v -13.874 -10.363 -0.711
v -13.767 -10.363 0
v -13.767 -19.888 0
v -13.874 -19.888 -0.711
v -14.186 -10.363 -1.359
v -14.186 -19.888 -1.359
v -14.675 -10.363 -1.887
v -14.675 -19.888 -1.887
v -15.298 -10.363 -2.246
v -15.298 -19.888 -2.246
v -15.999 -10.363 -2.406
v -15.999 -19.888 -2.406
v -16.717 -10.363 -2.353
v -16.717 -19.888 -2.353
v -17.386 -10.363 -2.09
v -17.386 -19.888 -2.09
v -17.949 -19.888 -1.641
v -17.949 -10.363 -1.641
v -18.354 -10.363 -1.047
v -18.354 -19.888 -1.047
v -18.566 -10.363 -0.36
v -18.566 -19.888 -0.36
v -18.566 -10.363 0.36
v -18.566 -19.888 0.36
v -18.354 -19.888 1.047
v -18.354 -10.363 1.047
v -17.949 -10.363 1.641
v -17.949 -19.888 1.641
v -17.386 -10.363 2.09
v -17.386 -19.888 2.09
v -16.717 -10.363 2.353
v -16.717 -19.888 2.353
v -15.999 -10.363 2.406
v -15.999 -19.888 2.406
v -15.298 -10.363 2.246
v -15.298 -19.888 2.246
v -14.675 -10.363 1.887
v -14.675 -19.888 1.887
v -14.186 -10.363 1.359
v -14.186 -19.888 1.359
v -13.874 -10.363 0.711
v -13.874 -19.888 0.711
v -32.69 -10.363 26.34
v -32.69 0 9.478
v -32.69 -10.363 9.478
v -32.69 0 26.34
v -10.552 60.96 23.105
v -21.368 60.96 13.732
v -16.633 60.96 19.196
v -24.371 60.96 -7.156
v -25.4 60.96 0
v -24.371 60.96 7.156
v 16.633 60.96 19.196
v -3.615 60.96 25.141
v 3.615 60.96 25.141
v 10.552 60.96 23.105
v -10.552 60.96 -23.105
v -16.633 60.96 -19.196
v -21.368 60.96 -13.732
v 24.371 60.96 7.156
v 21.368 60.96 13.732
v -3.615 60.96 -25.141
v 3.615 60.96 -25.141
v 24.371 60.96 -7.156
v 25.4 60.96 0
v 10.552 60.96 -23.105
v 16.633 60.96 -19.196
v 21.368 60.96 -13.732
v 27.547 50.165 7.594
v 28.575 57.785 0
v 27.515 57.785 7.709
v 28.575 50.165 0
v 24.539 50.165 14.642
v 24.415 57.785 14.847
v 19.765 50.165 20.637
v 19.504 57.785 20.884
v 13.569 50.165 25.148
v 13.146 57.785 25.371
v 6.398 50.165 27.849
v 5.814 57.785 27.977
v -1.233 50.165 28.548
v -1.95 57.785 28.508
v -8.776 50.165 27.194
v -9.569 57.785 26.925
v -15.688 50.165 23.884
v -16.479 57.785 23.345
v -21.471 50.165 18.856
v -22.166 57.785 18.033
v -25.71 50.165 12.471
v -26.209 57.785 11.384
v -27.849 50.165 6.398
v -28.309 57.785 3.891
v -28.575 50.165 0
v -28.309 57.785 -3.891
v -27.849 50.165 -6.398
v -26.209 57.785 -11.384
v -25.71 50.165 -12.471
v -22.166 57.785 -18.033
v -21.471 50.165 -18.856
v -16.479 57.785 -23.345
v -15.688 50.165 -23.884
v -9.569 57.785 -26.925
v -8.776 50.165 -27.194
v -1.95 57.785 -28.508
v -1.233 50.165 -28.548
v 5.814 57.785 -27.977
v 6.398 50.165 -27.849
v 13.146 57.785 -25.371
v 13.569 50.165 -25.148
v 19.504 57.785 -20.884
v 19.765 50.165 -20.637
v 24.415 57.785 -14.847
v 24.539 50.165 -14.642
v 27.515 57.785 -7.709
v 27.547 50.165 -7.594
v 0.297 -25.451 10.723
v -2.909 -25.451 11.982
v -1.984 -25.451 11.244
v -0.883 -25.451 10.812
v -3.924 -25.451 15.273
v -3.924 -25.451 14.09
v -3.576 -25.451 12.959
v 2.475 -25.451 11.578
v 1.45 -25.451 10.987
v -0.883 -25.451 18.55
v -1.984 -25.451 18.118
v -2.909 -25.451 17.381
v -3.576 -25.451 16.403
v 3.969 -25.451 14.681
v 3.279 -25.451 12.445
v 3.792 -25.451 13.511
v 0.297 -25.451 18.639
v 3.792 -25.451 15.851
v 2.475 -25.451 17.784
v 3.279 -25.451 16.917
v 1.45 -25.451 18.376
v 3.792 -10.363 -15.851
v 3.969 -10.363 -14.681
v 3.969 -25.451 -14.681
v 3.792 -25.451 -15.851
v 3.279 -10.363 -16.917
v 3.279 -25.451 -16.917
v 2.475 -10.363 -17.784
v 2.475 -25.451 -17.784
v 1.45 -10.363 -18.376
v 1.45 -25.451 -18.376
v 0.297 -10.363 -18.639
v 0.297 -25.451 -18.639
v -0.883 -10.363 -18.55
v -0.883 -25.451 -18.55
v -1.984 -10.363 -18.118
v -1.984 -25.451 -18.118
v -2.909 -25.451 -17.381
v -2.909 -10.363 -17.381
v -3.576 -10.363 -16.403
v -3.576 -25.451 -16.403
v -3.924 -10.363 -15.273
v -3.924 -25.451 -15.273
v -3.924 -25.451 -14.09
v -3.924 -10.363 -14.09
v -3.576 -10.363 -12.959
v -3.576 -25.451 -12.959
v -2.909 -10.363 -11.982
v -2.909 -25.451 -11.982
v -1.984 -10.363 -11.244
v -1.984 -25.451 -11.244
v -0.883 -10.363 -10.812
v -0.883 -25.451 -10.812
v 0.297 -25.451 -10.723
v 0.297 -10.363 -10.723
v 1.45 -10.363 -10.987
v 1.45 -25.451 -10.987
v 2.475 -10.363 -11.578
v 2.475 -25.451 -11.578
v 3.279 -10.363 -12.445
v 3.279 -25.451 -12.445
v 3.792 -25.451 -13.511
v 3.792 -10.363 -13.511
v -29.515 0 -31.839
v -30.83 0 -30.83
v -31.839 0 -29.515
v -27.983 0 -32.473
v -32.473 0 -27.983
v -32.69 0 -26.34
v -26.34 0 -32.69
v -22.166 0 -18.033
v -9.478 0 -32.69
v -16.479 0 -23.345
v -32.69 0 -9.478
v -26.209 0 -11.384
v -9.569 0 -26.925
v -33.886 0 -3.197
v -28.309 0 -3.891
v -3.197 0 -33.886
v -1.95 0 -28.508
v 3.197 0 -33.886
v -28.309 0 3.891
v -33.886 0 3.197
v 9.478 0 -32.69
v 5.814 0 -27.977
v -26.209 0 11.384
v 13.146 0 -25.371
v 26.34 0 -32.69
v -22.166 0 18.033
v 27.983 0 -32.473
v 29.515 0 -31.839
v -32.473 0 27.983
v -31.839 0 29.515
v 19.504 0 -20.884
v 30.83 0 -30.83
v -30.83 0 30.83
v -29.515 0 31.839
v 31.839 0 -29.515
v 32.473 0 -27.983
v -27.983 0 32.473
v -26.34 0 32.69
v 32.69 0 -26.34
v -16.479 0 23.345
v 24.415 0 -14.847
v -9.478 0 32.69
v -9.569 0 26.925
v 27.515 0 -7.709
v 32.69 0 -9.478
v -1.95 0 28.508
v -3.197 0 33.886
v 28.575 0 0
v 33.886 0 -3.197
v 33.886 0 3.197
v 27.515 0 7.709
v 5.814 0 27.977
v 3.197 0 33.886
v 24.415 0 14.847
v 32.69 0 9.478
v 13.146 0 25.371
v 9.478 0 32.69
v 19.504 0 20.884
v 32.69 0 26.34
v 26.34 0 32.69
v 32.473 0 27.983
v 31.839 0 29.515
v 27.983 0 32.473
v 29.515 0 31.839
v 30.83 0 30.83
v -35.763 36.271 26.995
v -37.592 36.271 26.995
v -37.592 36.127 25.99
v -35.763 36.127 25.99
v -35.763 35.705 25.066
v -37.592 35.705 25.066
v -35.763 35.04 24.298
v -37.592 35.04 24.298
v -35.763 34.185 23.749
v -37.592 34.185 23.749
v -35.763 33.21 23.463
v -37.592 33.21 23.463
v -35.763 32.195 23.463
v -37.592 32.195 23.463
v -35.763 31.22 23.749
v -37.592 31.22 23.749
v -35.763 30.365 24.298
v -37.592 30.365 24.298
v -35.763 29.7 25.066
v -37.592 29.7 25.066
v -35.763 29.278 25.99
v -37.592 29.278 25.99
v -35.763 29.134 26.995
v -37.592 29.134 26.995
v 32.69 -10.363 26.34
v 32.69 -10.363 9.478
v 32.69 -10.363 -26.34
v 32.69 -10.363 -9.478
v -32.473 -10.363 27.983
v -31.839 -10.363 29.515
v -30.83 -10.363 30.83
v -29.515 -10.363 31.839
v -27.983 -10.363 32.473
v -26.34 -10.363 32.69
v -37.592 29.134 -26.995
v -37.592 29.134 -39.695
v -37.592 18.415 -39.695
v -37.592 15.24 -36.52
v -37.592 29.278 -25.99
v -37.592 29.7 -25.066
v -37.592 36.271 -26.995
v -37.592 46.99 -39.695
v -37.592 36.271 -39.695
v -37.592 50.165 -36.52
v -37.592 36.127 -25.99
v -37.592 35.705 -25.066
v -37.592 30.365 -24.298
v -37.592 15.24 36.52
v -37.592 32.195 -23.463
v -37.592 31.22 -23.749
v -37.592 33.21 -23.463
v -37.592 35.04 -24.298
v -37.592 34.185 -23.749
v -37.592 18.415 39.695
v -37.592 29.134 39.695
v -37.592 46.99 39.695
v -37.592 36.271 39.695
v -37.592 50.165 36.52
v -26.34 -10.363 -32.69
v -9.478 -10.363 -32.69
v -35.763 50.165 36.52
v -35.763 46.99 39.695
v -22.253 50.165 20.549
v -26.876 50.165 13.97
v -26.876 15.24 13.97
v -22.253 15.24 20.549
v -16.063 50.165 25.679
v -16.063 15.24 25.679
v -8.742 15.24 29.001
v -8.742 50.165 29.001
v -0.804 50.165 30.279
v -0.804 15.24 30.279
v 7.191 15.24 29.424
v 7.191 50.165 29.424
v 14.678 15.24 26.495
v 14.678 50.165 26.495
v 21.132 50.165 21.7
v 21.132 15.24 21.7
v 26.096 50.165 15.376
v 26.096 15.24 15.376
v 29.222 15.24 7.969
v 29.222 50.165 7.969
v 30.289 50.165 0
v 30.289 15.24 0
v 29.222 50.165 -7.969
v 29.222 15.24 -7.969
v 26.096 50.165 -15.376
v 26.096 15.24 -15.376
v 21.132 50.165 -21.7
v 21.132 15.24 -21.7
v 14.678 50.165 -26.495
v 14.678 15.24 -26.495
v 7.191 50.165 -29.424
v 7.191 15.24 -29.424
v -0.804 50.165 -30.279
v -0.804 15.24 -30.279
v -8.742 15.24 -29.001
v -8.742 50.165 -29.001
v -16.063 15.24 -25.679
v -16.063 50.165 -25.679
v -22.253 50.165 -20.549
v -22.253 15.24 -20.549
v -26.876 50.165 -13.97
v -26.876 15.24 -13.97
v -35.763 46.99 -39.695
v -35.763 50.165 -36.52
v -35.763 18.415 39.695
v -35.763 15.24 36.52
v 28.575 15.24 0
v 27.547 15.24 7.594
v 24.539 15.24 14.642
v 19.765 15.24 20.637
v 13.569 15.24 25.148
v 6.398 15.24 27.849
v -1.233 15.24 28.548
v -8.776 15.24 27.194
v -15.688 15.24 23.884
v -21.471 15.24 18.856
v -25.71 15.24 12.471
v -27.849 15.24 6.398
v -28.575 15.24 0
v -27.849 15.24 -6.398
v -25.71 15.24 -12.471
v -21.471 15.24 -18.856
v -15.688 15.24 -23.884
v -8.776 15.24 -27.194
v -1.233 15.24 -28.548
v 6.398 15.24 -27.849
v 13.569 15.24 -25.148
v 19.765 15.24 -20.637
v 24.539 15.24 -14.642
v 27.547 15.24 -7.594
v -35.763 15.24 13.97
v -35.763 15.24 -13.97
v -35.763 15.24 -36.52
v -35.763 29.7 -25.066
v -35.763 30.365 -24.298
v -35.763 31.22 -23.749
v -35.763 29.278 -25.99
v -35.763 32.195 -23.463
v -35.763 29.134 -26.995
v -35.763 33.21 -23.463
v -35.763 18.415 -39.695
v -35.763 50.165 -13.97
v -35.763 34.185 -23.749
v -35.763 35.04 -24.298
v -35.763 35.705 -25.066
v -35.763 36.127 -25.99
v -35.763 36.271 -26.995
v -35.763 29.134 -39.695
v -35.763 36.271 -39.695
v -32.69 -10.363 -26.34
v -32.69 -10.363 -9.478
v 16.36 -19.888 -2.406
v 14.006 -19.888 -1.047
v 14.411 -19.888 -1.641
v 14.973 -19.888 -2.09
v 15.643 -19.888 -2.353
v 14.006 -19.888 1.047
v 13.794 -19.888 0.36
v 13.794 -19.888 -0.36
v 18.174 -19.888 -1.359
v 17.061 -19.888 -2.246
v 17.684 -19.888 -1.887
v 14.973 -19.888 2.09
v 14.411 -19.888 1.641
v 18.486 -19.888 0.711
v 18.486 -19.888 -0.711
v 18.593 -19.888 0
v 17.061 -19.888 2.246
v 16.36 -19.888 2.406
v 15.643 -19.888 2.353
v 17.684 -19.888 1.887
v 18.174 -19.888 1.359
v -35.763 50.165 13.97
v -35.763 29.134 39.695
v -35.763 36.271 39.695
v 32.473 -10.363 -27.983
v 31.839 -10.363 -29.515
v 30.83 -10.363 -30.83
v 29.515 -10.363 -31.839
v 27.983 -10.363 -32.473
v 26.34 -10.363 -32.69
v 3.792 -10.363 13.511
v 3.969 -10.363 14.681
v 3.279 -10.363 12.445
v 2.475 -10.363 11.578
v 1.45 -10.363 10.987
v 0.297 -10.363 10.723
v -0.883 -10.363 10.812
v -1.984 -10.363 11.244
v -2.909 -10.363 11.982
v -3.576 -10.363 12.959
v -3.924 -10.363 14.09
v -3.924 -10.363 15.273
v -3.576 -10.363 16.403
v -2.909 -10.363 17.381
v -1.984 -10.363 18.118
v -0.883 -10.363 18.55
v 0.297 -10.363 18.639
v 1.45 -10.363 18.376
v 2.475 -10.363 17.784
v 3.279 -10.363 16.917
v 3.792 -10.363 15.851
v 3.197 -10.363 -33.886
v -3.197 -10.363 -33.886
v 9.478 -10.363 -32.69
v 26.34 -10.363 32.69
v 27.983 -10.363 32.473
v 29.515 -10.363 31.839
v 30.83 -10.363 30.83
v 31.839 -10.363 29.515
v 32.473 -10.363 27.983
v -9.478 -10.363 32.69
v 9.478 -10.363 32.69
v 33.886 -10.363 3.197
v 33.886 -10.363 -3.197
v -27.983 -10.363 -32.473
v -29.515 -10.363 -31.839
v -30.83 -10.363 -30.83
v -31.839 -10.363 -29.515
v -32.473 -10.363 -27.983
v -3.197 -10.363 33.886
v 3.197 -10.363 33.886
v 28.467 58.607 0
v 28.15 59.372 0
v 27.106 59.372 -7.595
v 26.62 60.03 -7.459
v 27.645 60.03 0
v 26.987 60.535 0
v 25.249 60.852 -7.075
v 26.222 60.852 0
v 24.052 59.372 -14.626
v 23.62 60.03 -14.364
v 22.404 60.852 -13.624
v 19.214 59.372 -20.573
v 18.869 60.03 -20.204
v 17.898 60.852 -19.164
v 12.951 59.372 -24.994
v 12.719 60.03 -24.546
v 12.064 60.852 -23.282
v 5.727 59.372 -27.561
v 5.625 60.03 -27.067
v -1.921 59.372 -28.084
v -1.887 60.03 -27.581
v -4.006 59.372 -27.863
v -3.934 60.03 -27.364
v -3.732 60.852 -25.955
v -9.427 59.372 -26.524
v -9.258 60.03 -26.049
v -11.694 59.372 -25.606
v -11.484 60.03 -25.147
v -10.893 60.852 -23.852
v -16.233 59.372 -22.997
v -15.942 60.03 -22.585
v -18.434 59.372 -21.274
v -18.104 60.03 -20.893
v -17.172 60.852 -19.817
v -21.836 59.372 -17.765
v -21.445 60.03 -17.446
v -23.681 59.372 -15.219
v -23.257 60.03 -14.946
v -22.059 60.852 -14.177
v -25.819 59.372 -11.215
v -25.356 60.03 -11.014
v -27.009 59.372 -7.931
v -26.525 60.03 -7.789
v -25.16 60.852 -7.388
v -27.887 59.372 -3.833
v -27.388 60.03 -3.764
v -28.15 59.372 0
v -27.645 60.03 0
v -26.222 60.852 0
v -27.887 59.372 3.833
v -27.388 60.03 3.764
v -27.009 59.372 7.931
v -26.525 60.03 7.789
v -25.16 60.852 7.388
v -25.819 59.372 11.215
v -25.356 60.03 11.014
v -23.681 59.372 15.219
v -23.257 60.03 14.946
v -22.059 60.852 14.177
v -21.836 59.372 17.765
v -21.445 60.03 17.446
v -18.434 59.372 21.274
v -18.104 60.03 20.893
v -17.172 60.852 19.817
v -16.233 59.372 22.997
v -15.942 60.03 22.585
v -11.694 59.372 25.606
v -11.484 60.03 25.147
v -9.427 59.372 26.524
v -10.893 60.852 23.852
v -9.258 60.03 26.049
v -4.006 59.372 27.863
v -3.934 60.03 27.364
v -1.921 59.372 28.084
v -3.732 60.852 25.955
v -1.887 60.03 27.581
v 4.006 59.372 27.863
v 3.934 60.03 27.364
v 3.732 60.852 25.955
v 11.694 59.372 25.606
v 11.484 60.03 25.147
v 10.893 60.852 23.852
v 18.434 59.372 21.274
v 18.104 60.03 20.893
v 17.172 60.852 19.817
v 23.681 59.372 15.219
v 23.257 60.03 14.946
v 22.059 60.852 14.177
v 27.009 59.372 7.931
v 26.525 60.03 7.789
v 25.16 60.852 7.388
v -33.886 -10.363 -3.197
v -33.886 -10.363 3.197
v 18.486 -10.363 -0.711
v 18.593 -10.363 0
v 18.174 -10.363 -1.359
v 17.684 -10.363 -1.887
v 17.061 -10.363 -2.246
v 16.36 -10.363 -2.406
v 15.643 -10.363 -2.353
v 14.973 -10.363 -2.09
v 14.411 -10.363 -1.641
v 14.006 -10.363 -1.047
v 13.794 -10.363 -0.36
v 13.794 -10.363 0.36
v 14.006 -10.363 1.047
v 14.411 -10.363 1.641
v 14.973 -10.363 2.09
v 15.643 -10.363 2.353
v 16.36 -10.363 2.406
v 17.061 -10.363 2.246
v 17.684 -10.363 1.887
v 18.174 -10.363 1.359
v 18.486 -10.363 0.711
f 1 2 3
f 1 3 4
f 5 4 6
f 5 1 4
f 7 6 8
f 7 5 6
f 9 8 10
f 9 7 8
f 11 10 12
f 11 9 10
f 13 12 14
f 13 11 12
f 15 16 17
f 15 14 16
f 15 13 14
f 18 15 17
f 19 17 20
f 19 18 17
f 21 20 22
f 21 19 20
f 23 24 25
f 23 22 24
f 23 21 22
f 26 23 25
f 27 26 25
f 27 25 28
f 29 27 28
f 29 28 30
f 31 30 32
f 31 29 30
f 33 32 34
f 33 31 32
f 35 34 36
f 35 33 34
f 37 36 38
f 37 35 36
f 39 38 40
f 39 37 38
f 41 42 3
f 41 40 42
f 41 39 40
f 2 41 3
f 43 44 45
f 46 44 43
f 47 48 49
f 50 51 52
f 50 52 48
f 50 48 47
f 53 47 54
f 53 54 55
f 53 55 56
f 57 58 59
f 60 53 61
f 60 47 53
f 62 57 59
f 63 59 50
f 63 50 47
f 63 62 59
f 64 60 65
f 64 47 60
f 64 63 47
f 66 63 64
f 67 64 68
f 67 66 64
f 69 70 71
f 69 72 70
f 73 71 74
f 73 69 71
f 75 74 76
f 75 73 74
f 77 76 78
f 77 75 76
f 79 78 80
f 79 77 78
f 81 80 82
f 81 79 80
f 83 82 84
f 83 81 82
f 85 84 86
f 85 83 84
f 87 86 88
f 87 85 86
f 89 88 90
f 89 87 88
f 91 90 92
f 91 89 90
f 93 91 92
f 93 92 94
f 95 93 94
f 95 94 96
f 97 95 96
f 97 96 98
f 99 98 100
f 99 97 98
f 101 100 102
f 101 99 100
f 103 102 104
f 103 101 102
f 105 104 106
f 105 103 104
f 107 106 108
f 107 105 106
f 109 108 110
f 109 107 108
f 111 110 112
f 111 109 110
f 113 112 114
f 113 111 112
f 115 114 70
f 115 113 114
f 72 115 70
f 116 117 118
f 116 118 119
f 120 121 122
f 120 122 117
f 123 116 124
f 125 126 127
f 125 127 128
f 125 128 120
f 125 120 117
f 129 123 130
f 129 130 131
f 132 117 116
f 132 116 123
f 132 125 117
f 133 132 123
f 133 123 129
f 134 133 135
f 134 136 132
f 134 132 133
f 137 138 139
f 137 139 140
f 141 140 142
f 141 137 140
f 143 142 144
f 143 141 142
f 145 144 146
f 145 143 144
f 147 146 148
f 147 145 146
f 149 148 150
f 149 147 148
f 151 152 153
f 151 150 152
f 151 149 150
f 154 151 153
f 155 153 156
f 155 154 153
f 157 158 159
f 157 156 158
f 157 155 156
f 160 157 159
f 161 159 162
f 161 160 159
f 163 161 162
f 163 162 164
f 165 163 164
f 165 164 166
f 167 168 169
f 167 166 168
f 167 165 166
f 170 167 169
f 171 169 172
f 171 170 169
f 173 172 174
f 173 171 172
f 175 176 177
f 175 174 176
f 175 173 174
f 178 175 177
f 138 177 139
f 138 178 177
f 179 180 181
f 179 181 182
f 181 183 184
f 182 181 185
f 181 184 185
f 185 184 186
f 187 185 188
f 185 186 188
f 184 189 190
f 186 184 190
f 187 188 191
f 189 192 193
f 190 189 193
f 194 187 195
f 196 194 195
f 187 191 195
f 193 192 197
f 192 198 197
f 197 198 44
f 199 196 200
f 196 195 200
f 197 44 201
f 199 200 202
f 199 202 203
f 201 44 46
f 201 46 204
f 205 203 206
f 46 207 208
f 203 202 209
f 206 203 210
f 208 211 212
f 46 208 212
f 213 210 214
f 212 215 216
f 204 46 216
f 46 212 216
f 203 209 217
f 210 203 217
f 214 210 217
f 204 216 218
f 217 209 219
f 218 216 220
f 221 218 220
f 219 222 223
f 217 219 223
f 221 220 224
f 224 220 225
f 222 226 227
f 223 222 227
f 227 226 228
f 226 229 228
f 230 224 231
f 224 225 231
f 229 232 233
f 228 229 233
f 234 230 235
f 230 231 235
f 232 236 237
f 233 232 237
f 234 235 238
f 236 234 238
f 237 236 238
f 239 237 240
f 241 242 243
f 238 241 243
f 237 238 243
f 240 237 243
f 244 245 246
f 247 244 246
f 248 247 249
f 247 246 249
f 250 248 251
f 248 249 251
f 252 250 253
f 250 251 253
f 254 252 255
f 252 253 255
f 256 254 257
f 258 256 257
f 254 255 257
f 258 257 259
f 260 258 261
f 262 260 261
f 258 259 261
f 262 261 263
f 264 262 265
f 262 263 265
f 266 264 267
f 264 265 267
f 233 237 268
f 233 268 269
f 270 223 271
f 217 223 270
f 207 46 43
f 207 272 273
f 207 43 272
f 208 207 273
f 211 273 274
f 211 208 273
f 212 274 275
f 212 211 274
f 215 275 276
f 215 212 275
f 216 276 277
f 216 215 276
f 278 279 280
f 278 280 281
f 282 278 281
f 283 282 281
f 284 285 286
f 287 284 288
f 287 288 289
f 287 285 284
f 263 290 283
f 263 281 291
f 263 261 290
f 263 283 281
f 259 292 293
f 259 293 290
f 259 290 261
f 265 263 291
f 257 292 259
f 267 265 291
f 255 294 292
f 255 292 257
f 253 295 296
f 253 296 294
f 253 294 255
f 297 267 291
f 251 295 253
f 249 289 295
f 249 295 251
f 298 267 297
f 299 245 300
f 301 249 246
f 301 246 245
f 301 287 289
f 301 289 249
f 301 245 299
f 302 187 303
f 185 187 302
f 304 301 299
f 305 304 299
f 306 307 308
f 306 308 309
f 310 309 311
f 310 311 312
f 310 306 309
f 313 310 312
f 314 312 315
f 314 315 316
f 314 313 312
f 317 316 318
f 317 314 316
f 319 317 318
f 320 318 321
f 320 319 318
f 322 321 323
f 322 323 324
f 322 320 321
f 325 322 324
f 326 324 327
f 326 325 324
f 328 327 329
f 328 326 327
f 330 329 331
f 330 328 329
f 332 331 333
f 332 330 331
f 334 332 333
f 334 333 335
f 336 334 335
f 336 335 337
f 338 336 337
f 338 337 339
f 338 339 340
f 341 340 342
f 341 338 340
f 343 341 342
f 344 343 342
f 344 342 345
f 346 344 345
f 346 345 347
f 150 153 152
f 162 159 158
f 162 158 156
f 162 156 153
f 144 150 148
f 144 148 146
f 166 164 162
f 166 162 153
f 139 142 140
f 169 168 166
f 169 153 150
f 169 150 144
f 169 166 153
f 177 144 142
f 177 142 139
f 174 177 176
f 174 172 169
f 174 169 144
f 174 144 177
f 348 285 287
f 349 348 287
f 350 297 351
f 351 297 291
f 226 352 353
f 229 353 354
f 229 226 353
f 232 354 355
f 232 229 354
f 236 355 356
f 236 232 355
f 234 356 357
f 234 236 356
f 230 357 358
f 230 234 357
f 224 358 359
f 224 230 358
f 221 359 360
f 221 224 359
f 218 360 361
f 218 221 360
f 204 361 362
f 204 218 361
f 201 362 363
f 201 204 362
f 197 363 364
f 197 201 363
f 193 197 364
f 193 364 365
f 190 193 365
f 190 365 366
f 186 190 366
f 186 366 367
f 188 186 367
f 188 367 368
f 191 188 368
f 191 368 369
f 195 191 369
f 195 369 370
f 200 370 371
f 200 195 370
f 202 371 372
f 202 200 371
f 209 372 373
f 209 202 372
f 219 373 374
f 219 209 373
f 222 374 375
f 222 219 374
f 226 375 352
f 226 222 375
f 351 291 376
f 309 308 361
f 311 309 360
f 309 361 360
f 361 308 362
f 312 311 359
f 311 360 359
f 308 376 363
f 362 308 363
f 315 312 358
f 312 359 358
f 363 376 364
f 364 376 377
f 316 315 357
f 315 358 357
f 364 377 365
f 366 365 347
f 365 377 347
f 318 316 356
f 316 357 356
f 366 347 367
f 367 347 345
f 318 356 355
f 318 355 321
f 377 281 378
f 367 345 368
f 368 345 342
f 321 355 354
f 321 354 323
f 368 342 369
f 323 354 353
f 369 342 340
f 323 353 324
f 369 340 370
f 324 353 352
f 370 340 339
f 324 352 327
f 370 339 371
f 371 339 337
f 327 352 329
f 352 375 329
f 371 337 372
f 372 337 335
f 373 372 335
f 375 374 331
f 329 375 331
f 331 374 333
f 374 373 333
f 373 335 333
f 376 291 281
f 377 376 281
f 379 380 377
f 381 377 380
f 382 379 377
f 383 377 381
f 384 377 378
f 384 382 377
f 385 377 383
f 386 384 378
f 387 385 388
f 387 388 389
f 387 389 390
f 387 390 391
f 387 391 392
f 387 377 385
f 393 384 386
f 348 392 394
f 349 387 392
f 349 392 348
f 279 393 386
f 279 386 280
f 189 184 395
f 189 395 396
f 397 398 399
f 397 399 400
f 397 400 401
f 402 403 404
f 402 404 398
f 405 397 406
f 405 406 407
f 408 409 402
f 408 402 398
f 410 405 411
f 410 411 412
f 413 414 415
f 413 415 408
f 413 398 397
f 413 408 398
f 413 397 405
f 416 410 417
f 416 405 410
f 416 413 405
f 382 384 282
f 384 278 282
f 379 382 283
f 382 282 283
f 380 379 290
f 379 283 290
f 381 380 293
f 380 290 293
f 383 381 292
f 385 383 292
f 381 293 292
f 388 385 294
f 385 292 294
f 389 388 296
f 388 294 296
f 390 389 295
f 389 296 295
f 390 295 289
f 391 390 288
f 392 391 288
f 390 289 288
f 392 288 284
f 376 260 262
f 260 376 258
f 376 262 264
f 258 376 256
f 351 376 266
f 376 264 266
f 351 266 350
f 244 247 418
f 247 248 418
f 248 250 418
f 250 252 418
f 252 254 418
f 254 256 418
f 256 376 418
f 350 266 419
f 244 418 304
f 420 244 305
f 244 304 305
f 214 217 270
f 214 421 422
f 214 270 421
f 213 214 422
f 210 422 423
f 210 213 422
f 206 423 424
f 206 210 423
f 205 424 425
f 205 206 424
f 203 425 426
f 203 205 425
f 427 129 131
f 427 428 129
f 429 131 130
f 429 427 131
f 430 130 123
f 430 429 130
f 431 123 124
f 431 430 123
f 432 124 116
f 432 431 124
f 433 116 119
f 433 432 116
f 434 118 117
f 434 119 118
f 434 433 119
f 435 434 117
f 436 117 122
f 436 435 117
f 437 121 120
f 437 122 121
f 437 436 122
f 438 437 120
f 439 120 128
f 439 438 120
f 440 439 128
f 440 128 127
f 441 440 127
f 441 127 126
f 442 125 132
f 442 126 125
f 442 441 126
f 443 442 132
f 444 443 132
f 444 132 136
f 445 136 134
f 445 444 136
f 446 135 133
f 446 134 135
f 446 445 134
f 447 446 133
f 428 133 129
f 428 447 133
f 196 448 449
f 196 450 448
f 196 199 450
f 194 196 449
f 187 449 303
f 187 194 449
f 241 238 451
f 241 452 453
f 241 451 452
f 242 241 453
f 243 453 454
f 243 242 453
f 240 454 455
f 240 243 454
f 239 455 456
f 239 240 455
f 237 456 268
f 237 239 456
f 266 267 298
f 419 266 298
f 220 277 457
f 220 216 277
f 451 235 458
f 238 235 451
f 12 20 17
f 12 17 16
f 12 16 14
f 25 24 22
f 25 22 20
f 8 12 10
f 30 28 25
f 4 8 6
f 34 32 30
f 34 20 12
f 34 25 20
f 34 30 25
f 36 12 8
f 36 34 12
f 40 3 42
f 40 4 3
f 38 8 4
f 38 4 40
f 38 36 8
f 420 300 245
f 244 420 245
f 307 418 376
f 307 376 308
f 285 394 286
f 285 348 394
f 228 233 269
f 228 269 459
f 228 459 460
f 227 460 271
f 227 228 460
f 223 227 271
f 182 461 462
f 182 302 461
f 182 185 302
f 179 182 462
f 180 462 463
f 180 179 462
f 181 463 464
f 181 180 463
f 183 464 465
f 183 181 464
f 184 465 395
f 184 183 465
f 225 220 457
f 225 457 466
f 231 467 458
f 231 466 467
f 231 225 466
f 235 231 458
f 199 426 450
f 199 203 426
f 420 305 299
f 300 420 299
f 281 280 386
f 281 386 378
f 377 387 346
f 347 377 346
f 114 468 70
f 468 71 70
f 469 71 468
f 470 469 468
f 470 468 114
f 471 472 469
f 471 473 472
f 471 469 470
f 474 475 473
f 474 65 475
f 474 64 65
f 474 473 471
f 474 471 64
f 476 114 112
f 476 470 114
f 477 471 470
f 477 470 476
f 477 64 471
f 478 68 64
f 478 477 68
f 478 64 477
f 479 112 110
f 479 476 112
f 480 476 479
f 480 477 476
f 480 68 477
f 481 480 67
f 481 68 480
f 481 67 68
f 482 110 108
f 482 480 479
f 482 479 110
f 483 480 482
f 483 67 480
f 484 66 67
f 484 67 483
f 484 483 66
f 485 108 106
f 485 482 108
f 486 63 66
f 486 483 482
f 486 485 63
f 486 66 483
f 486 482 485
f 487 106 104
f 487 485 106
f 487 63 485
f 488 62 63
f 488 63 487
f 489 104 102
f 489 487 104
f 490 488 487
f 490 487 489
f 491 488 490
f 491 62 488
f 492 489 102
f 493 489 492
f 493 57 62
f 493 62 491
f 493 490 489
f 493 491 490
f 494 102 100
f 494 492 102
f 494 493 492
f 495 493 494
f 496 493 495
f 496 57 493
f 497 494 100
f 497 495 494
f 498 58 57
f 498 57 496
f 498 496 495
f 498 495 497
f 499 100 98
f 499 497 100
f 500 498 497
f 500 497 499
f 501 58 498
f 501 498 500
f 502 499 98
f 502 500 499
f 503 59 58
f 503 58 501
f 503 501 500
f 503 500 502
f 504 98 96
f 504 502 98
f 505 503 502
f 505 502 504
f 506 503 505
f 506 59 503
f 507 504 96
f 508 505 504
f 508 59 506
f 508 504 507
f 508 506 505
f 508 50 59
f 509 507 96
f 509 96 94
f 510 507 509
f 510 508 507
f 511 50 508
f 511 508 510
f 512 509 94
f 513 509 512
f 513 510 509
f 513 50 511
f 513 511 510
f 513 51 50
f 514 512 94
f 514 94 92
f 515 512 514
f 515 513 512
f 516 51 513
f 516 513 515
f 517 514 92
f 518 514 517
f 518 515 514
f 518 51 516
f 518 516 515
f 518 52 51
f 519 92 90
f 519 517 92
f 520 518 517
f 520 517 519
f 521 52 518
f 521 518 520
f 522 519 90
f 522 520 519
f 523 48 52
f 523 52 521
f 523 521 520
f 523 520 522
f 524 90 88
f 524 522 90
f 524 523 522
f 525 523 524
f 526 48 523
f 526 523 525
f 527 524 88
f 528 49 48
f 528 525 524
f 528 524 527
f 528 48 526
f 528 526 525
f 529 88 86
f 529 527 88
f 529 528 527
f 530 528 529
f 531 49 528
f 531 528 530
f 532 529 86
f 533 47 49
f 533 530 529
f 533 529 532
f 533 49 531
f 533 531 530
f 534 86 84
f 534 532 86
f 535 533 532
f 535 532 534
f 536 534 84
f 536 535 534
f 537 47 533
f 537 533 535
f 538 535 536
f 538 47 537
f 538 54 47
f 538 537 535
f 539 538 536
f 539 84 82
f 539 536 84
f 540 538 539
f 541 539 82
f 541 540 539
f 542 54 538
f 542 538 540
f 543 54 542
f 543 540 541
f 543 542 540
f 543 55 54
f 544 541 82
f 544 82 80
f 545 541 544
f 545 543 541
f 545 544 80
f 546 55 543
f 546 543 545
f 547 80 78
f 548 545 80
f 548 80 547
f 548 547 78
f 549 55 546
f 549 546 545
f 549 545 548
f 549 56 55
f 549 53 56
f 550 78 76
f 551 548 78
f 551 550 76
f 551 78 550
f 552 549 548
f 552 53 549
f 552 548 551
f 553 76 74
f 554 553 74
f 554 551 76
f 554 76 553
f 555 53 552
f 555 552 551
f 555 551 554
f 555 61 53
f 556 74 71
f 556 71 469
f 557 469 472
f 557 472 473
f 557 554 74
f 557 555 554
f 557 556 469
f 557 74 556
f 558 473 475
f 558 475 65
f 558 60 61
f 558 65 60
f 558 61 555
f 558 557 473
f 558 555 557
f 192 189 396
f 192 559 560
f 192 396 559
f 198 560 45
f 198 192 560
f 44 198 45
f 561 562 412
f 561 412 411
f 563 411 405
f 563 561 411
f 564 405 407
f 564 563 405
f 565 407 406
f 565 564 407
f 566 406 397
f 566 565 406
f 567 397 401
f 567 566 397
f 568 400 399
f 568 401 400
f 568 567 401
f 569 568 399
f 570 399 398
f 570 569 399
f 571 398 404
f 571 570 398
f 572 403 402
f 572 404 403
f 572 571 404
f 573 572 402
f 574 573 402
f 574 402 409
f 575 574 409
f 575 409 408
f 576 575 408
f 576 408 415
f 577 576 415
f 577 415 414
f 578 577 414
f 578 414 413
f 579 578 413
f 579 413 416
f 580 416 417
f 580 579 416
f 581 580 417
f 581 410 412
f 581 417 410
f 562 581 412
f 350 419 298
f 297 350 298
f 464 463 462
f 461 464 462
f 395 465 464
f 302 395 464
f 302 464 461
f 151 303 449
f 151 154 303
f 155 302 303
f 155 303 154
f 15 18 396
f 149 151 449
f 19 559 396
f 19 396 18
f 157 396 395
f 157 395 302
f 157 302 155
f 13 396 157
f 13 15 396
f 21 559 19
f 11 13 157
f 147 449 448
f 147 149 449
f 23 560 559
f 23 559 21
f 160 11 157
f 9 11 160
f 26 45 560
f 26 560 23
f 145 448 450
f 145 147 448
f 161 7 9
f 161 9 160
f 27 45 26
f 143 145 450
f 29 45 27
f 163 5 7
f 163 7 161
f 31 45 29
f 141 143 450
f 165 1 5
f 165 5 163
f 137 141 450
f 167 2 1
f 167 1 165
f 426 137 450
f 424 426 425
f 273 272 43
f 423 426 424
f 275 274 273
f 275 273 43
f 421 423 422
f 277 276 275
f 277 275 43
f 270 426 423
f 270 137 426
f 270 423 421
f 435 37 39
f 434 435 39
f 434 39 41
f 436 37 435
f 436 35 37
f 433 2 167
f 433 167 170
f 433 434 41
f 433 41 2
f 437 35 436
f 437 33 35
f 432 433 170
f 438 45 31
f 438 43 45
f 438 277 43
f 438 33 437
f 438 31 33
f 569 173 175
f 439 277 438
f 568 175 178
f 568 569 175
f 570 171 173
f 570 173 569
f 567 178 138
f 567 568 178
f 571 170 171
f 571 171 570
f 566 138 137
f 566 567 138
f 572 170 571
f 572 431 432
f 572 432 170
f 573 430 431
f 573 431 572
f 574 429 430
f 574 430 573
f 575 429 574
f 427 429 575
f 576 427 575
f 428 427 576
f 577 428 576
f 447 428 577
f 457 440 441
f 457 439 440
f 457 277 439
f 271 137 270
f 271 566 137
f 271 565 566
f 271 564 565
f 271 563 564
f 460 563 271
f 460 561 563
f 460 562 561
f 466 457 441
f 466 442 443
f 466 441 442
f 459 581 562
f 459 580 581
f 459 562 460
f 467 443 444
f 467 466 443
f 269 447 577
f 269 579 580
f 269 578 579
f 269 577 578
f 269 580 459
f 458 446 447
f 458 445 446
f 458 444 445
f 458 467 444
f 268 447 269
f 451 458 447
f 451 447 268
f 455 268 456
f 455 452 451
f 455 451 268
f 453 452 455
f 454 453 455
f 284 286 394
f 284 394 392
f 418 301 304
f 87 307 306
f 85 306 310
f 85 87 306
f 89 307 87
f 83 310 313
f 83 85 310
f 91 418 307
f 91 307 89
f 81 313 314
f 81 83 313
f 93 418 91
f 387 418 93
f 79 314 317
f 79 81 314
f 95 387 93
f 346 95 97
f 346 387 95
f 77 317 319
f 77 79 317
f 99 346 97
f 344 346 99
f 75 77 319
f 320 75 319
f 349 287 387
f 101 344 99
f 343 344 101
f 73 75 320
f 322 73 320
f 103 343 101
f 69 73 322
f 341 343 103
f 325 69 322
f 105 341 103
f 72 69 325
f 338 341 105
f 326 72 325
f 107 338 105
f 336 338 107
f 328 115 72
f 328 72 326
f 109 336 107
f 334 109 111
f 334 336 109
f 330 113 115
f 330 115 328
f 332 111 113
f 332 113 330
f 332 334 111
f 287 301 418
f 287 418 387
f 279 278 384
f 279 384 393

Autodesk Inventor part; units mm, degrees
ref_plane "YZ Plane" through (0, 0, 0) normal (1, 0, 0) x (0, 1, 0)
ref_plane "XZ Plane" through (0, 0, 0) normal (0, 1, 0) x (-1, 0, 0)
ref_plane "XY Plane" through (0, 0, 0) normal (0, 0, 1) x (1, 0, 0)
sketch "Sketch1" plane through (0, 0, 0) normal (0, 0, 1) x (1, 0, 0)
  line L0 (0, 0) -> (0, 60.96)
  line L1 (0, 60.96) -> (25.4, 60.96)
  arc A0 (28.575, 57.785) -> (25.4, 60.96) centre (25.4, 57.785) ccw
  line L2 (28.575, 57.785) -> (28.575, 0)
  line L3 (28.575, 0) -> (0, 0)
  dimension "d0" = 3.175
  dimension "d1" = 60.96
  dimension "d3" = 28.575
revolve "Can" add sketch "Sketch1" angle 360 about axis through (0, 0, 0) along (0, 1, 0)
sketch "Sketch2" plane through (0, 0, 0) normal (0, -1, 0) x (1, 0, 0)
  circle A0 centre (0, 0) radius 28.575 projected
  circle A1 centre (0, 0) radius 34.036
  line L0 (-26.3398, 32.6898) -> (26.3398, 32.6898)
  line L1 (32.6898, 26.3398) -> (32.6898, -26.3398)
  line L2 (26.3398, -32.6898) -> (-26.3398, -32.6898)
  line L3 (-32.6898, -26.3398) -> (-32.6898, 26.3398)
  arc A2 (32.6898, 26.3398) -> (26.3398, 32.6898) centre (26.3398, 26.3398) ccw
  arc A3 (-26.3398, 32.6898) -> (-32.6898, 26.3398) centre (-26.3398, 26.3398) ccw
  arc A4 (-32.6898, -26.3398) -> (-26.3398, -32.6898) centre (-26.3398, -26.3398) ccw
  arc A5 (26.3398, -32.6898) -> (32.6898, -26.3398) centre (26.3398, -26.3398) ccw
  point P0 (-32.6898, 32.6898)
  point P1 (32.6898, 32.6898)
  point P2 (0, 32.6898)
  point P3 (-32.6898, 0)
  dimension "d5" = 65.3796
  dimension "d6" = 68.072
  dimension "d7" = 6.35
extrude "Plate" add sketch "Sketch2" along normal blind 10.3632 contours A0 | A1 L1 | L1 A1 L2 L3 L0 | A1 L0 A2 L1 | L1 A5 L2 A1 | L0 A1 | A1 L2 | A1 L3 A3 L0 | L2 A4 L3 A1 | L3 A1
sketch "Sketch3" plane through (0, -10.3632, 0) normal (0, -1, 0) x (1, 0, 0)
  arc A0 (-9.4777, -32.6898) -> (9.4777, -32.6898) centre (0, 0) ccw projected
  circle A1 centre (-16.1798, 0) radius 2.413
  circle A2 centre (16.1798, 0) radius 2.413
  dimension "d10" = 4.826
  dimension "d11" = 32.3596
  dimension "d12" = 16.1798
extrude "Coil Studs" add sketch "Sketch3" along normal blind 9.525
thread "Coil Stud 1" size "10-32 UNF" class "2A" standard "ANSI Unified Screw Threads" full length
thread "Coil Stud 2" size "10-32 UNF" class "2A" standard "ANSI Unified Screw Threads" full length
sketch "Sketch4" plane through (0, -10.3632, 0) normal (0, -1, 0) x (1, 0, 0)
  arc A0 (-9.4777, -32.6898) -> (9.4777, -32.6898) centre (0, 0) ccw projected
  circle A1 centre (0, 14.6812) radius 3.9688
  circle A2 centre (0, -14.6812) radius 3.9688
  dimension "d19" = 29.3624
  dimension "d20" = 14.6812
  dimension "d21" = 7.9375
extrude "Power Studs" add sketch "Sketch4" along normal blind 15.0876
thread "Power Stud 1" size "5/16-18 UNC" class "2A" standard "ANSI Unified Screw Threads" full length
thread "Power Stud 2" size "5/16-18 UNC" class "2A" standard "ANSI Unified Screw Threads" full length
ref_plane "Work Plane1" through (0, 15.24, 0) normal (0, 1, 0) x (1, 0, 0)
sketch "Sketch5" plane through (0, 15.24, 0) normal (0, 1, 0) x (1, 0, 0)
  line L0 (-37.592, 12.4714) -> (-19.05, 12.4714)
  line L1 (-19.05, 12.4714) -> (-19.05, -12.4714)
  line L2 (-19.05, -12.4714) -> (-37.592, -12.4714)
  line L3 (-37.592, -12.4714) -> (-37.592, 12.4714)
  point P0 (0, 0)
  point P1 (-19.05, 0)
  dimension "d29" = 37.592
  dimension "d30" = 24.9428
  dimension "d31" = 19.05
extrude "Extrusion4" add sketch "Sketch5" along normal blind 34.925
sketch "Sketch6" plane through (0, 50.165, 0) normal (0, 1, 0) x (1, 0, 0)
  arc A0 (-25.7098, 12.4714) -> (-25.7098, -12.4714) centre (0, 0) ccw projected
  line L0 (-37.592, 12.4714) -> (-25.7098, 12.4714) projected
  line L1 (-25.7098, -12.4714) -> (-37.592, -12.4714) projected
  line L2 (-37.592, 12.4714) -> (-35.7632, 12.4714)
  line L3 (-35.7632, 13.97) -> (-35.7632, 39.6951)
  line L4 (-35.7632, 39.6951) -> (-37.592, 39.6951)
  line L5 (-37.592, 39.6951) -> (-37.592, 12.4714)
  circle A1 centre (0, 0) radius 28.575
  arc A2 (-26.8755, -13.97) -> (-26.8755, 13.97) centre (0, 0) ccw
  line L6 (-35.7632, 13.97) -> (-26.8755, 13.97)
  line L7 (-37.592, -12.4714) -> (-35.7632, -12.4714)
  line L8 (-35.7632, -13.97) -> (-35.7632, -39.6951)
  line L9 (-35.7632, -39.6951) -> (-37.592, -39.6951)
  line L10 (-37.592, -39.6951) -> (-37.592, -12.4714)
  line L11 (-35.7632, -13.97) -> (-26.8755, -13.97)
  dimension "d34" = 57.15
  dimension "d35" = 60.579
  dimension "d36" = 27.94
  dimension "d37" = 1.8288
  dimension "d38" = 79.3902
extrude "Mounting Plate" add sketch "Sketch6" against normal blind 34.925 contours L0 L5 L4 L3 L6 A2 L11 L8 L9 L10 L1 A1
sketch "Sketch7" plane through (-37.592, 15.24, -39.6951) normal (-1, 0, 0) x (0, 0, 1)
  line L0 (0, 34.925) -> (79.3902, 34.925) projected
  line L1 (0, 34.925) -> (0, 0) projected
  line L2 (0, 0) -> (79.3902, 0) projected
  line L3 (79.3902, 34.925) -> (79.3902, 0) projected
  circle A0 centre (12.7, 17.4625) radius 3.5687
  line L4 (0, 21.0312) -> (12.7, 21.0312)
  line L5 (12.7, 21.0312) -> (12.7, 13.8938)
  line L6 (12.7, 13.8938) -> (0, 13.8938)
  line L7 (0, 13.8938) -> (0, 21.0312)
  line L8 (0, 31.75) -> (3.175, 34.925)
  line L9 (0, 17.4625) -> (79.3902, 17.4625)
  line L10 (39.6951, 34.925) -> (39.6951, 0)
  circle A1 centre (66.6902, 17.4625) radius 3.5687
  line L11 (79.3902, 21.0312) -> (66.6902, 21.0312)
  line L12 (66.6902, 21.0312) -> (66.6902, 13.8938)
  line L13 (66.6902, 13.8938) -> (79.3902, 13.8938)
  line L14 (79.3902, 13.8938) -> (79.3902, 21.0312)
  line L15 (0, 3.175) -> (3.175, 0)
  line L16 (79.3902, 3.175) -> (76.2152, 0)
  line L17 (76.2152, 34.925) -> (79.3902, 31.75)
  point P0 (39.6951, -15.24)
  dimension "d41" = 7.1374
  dimension "d42" = 12.7
  dimension "d43" = 3.175
  dimension "d44" = 3.175
extrude "Extrusion6" cut sketch "Sketch7" against normal up to next contours L0 L8 L1 | L4 A0 L9 L1 | L0 L3 L17 | L9 A0 L6 L1 | L5 L9 A0 | A0 L9 L5 | A0 L5 L9 | A1 L12 L9 | L9 L12 A1 | L9 L5 A0 | L3 L9 A1 L11 | L12 A1 L9 | L9 A1 L12 | A1 L9 L3 L13 | L2 L1 L15 | L16 L3 L2
equation "\"d12\" = 0.5 * d11"
equation "\"d20\" = 0.5 * d19"
properties part number "realy"
